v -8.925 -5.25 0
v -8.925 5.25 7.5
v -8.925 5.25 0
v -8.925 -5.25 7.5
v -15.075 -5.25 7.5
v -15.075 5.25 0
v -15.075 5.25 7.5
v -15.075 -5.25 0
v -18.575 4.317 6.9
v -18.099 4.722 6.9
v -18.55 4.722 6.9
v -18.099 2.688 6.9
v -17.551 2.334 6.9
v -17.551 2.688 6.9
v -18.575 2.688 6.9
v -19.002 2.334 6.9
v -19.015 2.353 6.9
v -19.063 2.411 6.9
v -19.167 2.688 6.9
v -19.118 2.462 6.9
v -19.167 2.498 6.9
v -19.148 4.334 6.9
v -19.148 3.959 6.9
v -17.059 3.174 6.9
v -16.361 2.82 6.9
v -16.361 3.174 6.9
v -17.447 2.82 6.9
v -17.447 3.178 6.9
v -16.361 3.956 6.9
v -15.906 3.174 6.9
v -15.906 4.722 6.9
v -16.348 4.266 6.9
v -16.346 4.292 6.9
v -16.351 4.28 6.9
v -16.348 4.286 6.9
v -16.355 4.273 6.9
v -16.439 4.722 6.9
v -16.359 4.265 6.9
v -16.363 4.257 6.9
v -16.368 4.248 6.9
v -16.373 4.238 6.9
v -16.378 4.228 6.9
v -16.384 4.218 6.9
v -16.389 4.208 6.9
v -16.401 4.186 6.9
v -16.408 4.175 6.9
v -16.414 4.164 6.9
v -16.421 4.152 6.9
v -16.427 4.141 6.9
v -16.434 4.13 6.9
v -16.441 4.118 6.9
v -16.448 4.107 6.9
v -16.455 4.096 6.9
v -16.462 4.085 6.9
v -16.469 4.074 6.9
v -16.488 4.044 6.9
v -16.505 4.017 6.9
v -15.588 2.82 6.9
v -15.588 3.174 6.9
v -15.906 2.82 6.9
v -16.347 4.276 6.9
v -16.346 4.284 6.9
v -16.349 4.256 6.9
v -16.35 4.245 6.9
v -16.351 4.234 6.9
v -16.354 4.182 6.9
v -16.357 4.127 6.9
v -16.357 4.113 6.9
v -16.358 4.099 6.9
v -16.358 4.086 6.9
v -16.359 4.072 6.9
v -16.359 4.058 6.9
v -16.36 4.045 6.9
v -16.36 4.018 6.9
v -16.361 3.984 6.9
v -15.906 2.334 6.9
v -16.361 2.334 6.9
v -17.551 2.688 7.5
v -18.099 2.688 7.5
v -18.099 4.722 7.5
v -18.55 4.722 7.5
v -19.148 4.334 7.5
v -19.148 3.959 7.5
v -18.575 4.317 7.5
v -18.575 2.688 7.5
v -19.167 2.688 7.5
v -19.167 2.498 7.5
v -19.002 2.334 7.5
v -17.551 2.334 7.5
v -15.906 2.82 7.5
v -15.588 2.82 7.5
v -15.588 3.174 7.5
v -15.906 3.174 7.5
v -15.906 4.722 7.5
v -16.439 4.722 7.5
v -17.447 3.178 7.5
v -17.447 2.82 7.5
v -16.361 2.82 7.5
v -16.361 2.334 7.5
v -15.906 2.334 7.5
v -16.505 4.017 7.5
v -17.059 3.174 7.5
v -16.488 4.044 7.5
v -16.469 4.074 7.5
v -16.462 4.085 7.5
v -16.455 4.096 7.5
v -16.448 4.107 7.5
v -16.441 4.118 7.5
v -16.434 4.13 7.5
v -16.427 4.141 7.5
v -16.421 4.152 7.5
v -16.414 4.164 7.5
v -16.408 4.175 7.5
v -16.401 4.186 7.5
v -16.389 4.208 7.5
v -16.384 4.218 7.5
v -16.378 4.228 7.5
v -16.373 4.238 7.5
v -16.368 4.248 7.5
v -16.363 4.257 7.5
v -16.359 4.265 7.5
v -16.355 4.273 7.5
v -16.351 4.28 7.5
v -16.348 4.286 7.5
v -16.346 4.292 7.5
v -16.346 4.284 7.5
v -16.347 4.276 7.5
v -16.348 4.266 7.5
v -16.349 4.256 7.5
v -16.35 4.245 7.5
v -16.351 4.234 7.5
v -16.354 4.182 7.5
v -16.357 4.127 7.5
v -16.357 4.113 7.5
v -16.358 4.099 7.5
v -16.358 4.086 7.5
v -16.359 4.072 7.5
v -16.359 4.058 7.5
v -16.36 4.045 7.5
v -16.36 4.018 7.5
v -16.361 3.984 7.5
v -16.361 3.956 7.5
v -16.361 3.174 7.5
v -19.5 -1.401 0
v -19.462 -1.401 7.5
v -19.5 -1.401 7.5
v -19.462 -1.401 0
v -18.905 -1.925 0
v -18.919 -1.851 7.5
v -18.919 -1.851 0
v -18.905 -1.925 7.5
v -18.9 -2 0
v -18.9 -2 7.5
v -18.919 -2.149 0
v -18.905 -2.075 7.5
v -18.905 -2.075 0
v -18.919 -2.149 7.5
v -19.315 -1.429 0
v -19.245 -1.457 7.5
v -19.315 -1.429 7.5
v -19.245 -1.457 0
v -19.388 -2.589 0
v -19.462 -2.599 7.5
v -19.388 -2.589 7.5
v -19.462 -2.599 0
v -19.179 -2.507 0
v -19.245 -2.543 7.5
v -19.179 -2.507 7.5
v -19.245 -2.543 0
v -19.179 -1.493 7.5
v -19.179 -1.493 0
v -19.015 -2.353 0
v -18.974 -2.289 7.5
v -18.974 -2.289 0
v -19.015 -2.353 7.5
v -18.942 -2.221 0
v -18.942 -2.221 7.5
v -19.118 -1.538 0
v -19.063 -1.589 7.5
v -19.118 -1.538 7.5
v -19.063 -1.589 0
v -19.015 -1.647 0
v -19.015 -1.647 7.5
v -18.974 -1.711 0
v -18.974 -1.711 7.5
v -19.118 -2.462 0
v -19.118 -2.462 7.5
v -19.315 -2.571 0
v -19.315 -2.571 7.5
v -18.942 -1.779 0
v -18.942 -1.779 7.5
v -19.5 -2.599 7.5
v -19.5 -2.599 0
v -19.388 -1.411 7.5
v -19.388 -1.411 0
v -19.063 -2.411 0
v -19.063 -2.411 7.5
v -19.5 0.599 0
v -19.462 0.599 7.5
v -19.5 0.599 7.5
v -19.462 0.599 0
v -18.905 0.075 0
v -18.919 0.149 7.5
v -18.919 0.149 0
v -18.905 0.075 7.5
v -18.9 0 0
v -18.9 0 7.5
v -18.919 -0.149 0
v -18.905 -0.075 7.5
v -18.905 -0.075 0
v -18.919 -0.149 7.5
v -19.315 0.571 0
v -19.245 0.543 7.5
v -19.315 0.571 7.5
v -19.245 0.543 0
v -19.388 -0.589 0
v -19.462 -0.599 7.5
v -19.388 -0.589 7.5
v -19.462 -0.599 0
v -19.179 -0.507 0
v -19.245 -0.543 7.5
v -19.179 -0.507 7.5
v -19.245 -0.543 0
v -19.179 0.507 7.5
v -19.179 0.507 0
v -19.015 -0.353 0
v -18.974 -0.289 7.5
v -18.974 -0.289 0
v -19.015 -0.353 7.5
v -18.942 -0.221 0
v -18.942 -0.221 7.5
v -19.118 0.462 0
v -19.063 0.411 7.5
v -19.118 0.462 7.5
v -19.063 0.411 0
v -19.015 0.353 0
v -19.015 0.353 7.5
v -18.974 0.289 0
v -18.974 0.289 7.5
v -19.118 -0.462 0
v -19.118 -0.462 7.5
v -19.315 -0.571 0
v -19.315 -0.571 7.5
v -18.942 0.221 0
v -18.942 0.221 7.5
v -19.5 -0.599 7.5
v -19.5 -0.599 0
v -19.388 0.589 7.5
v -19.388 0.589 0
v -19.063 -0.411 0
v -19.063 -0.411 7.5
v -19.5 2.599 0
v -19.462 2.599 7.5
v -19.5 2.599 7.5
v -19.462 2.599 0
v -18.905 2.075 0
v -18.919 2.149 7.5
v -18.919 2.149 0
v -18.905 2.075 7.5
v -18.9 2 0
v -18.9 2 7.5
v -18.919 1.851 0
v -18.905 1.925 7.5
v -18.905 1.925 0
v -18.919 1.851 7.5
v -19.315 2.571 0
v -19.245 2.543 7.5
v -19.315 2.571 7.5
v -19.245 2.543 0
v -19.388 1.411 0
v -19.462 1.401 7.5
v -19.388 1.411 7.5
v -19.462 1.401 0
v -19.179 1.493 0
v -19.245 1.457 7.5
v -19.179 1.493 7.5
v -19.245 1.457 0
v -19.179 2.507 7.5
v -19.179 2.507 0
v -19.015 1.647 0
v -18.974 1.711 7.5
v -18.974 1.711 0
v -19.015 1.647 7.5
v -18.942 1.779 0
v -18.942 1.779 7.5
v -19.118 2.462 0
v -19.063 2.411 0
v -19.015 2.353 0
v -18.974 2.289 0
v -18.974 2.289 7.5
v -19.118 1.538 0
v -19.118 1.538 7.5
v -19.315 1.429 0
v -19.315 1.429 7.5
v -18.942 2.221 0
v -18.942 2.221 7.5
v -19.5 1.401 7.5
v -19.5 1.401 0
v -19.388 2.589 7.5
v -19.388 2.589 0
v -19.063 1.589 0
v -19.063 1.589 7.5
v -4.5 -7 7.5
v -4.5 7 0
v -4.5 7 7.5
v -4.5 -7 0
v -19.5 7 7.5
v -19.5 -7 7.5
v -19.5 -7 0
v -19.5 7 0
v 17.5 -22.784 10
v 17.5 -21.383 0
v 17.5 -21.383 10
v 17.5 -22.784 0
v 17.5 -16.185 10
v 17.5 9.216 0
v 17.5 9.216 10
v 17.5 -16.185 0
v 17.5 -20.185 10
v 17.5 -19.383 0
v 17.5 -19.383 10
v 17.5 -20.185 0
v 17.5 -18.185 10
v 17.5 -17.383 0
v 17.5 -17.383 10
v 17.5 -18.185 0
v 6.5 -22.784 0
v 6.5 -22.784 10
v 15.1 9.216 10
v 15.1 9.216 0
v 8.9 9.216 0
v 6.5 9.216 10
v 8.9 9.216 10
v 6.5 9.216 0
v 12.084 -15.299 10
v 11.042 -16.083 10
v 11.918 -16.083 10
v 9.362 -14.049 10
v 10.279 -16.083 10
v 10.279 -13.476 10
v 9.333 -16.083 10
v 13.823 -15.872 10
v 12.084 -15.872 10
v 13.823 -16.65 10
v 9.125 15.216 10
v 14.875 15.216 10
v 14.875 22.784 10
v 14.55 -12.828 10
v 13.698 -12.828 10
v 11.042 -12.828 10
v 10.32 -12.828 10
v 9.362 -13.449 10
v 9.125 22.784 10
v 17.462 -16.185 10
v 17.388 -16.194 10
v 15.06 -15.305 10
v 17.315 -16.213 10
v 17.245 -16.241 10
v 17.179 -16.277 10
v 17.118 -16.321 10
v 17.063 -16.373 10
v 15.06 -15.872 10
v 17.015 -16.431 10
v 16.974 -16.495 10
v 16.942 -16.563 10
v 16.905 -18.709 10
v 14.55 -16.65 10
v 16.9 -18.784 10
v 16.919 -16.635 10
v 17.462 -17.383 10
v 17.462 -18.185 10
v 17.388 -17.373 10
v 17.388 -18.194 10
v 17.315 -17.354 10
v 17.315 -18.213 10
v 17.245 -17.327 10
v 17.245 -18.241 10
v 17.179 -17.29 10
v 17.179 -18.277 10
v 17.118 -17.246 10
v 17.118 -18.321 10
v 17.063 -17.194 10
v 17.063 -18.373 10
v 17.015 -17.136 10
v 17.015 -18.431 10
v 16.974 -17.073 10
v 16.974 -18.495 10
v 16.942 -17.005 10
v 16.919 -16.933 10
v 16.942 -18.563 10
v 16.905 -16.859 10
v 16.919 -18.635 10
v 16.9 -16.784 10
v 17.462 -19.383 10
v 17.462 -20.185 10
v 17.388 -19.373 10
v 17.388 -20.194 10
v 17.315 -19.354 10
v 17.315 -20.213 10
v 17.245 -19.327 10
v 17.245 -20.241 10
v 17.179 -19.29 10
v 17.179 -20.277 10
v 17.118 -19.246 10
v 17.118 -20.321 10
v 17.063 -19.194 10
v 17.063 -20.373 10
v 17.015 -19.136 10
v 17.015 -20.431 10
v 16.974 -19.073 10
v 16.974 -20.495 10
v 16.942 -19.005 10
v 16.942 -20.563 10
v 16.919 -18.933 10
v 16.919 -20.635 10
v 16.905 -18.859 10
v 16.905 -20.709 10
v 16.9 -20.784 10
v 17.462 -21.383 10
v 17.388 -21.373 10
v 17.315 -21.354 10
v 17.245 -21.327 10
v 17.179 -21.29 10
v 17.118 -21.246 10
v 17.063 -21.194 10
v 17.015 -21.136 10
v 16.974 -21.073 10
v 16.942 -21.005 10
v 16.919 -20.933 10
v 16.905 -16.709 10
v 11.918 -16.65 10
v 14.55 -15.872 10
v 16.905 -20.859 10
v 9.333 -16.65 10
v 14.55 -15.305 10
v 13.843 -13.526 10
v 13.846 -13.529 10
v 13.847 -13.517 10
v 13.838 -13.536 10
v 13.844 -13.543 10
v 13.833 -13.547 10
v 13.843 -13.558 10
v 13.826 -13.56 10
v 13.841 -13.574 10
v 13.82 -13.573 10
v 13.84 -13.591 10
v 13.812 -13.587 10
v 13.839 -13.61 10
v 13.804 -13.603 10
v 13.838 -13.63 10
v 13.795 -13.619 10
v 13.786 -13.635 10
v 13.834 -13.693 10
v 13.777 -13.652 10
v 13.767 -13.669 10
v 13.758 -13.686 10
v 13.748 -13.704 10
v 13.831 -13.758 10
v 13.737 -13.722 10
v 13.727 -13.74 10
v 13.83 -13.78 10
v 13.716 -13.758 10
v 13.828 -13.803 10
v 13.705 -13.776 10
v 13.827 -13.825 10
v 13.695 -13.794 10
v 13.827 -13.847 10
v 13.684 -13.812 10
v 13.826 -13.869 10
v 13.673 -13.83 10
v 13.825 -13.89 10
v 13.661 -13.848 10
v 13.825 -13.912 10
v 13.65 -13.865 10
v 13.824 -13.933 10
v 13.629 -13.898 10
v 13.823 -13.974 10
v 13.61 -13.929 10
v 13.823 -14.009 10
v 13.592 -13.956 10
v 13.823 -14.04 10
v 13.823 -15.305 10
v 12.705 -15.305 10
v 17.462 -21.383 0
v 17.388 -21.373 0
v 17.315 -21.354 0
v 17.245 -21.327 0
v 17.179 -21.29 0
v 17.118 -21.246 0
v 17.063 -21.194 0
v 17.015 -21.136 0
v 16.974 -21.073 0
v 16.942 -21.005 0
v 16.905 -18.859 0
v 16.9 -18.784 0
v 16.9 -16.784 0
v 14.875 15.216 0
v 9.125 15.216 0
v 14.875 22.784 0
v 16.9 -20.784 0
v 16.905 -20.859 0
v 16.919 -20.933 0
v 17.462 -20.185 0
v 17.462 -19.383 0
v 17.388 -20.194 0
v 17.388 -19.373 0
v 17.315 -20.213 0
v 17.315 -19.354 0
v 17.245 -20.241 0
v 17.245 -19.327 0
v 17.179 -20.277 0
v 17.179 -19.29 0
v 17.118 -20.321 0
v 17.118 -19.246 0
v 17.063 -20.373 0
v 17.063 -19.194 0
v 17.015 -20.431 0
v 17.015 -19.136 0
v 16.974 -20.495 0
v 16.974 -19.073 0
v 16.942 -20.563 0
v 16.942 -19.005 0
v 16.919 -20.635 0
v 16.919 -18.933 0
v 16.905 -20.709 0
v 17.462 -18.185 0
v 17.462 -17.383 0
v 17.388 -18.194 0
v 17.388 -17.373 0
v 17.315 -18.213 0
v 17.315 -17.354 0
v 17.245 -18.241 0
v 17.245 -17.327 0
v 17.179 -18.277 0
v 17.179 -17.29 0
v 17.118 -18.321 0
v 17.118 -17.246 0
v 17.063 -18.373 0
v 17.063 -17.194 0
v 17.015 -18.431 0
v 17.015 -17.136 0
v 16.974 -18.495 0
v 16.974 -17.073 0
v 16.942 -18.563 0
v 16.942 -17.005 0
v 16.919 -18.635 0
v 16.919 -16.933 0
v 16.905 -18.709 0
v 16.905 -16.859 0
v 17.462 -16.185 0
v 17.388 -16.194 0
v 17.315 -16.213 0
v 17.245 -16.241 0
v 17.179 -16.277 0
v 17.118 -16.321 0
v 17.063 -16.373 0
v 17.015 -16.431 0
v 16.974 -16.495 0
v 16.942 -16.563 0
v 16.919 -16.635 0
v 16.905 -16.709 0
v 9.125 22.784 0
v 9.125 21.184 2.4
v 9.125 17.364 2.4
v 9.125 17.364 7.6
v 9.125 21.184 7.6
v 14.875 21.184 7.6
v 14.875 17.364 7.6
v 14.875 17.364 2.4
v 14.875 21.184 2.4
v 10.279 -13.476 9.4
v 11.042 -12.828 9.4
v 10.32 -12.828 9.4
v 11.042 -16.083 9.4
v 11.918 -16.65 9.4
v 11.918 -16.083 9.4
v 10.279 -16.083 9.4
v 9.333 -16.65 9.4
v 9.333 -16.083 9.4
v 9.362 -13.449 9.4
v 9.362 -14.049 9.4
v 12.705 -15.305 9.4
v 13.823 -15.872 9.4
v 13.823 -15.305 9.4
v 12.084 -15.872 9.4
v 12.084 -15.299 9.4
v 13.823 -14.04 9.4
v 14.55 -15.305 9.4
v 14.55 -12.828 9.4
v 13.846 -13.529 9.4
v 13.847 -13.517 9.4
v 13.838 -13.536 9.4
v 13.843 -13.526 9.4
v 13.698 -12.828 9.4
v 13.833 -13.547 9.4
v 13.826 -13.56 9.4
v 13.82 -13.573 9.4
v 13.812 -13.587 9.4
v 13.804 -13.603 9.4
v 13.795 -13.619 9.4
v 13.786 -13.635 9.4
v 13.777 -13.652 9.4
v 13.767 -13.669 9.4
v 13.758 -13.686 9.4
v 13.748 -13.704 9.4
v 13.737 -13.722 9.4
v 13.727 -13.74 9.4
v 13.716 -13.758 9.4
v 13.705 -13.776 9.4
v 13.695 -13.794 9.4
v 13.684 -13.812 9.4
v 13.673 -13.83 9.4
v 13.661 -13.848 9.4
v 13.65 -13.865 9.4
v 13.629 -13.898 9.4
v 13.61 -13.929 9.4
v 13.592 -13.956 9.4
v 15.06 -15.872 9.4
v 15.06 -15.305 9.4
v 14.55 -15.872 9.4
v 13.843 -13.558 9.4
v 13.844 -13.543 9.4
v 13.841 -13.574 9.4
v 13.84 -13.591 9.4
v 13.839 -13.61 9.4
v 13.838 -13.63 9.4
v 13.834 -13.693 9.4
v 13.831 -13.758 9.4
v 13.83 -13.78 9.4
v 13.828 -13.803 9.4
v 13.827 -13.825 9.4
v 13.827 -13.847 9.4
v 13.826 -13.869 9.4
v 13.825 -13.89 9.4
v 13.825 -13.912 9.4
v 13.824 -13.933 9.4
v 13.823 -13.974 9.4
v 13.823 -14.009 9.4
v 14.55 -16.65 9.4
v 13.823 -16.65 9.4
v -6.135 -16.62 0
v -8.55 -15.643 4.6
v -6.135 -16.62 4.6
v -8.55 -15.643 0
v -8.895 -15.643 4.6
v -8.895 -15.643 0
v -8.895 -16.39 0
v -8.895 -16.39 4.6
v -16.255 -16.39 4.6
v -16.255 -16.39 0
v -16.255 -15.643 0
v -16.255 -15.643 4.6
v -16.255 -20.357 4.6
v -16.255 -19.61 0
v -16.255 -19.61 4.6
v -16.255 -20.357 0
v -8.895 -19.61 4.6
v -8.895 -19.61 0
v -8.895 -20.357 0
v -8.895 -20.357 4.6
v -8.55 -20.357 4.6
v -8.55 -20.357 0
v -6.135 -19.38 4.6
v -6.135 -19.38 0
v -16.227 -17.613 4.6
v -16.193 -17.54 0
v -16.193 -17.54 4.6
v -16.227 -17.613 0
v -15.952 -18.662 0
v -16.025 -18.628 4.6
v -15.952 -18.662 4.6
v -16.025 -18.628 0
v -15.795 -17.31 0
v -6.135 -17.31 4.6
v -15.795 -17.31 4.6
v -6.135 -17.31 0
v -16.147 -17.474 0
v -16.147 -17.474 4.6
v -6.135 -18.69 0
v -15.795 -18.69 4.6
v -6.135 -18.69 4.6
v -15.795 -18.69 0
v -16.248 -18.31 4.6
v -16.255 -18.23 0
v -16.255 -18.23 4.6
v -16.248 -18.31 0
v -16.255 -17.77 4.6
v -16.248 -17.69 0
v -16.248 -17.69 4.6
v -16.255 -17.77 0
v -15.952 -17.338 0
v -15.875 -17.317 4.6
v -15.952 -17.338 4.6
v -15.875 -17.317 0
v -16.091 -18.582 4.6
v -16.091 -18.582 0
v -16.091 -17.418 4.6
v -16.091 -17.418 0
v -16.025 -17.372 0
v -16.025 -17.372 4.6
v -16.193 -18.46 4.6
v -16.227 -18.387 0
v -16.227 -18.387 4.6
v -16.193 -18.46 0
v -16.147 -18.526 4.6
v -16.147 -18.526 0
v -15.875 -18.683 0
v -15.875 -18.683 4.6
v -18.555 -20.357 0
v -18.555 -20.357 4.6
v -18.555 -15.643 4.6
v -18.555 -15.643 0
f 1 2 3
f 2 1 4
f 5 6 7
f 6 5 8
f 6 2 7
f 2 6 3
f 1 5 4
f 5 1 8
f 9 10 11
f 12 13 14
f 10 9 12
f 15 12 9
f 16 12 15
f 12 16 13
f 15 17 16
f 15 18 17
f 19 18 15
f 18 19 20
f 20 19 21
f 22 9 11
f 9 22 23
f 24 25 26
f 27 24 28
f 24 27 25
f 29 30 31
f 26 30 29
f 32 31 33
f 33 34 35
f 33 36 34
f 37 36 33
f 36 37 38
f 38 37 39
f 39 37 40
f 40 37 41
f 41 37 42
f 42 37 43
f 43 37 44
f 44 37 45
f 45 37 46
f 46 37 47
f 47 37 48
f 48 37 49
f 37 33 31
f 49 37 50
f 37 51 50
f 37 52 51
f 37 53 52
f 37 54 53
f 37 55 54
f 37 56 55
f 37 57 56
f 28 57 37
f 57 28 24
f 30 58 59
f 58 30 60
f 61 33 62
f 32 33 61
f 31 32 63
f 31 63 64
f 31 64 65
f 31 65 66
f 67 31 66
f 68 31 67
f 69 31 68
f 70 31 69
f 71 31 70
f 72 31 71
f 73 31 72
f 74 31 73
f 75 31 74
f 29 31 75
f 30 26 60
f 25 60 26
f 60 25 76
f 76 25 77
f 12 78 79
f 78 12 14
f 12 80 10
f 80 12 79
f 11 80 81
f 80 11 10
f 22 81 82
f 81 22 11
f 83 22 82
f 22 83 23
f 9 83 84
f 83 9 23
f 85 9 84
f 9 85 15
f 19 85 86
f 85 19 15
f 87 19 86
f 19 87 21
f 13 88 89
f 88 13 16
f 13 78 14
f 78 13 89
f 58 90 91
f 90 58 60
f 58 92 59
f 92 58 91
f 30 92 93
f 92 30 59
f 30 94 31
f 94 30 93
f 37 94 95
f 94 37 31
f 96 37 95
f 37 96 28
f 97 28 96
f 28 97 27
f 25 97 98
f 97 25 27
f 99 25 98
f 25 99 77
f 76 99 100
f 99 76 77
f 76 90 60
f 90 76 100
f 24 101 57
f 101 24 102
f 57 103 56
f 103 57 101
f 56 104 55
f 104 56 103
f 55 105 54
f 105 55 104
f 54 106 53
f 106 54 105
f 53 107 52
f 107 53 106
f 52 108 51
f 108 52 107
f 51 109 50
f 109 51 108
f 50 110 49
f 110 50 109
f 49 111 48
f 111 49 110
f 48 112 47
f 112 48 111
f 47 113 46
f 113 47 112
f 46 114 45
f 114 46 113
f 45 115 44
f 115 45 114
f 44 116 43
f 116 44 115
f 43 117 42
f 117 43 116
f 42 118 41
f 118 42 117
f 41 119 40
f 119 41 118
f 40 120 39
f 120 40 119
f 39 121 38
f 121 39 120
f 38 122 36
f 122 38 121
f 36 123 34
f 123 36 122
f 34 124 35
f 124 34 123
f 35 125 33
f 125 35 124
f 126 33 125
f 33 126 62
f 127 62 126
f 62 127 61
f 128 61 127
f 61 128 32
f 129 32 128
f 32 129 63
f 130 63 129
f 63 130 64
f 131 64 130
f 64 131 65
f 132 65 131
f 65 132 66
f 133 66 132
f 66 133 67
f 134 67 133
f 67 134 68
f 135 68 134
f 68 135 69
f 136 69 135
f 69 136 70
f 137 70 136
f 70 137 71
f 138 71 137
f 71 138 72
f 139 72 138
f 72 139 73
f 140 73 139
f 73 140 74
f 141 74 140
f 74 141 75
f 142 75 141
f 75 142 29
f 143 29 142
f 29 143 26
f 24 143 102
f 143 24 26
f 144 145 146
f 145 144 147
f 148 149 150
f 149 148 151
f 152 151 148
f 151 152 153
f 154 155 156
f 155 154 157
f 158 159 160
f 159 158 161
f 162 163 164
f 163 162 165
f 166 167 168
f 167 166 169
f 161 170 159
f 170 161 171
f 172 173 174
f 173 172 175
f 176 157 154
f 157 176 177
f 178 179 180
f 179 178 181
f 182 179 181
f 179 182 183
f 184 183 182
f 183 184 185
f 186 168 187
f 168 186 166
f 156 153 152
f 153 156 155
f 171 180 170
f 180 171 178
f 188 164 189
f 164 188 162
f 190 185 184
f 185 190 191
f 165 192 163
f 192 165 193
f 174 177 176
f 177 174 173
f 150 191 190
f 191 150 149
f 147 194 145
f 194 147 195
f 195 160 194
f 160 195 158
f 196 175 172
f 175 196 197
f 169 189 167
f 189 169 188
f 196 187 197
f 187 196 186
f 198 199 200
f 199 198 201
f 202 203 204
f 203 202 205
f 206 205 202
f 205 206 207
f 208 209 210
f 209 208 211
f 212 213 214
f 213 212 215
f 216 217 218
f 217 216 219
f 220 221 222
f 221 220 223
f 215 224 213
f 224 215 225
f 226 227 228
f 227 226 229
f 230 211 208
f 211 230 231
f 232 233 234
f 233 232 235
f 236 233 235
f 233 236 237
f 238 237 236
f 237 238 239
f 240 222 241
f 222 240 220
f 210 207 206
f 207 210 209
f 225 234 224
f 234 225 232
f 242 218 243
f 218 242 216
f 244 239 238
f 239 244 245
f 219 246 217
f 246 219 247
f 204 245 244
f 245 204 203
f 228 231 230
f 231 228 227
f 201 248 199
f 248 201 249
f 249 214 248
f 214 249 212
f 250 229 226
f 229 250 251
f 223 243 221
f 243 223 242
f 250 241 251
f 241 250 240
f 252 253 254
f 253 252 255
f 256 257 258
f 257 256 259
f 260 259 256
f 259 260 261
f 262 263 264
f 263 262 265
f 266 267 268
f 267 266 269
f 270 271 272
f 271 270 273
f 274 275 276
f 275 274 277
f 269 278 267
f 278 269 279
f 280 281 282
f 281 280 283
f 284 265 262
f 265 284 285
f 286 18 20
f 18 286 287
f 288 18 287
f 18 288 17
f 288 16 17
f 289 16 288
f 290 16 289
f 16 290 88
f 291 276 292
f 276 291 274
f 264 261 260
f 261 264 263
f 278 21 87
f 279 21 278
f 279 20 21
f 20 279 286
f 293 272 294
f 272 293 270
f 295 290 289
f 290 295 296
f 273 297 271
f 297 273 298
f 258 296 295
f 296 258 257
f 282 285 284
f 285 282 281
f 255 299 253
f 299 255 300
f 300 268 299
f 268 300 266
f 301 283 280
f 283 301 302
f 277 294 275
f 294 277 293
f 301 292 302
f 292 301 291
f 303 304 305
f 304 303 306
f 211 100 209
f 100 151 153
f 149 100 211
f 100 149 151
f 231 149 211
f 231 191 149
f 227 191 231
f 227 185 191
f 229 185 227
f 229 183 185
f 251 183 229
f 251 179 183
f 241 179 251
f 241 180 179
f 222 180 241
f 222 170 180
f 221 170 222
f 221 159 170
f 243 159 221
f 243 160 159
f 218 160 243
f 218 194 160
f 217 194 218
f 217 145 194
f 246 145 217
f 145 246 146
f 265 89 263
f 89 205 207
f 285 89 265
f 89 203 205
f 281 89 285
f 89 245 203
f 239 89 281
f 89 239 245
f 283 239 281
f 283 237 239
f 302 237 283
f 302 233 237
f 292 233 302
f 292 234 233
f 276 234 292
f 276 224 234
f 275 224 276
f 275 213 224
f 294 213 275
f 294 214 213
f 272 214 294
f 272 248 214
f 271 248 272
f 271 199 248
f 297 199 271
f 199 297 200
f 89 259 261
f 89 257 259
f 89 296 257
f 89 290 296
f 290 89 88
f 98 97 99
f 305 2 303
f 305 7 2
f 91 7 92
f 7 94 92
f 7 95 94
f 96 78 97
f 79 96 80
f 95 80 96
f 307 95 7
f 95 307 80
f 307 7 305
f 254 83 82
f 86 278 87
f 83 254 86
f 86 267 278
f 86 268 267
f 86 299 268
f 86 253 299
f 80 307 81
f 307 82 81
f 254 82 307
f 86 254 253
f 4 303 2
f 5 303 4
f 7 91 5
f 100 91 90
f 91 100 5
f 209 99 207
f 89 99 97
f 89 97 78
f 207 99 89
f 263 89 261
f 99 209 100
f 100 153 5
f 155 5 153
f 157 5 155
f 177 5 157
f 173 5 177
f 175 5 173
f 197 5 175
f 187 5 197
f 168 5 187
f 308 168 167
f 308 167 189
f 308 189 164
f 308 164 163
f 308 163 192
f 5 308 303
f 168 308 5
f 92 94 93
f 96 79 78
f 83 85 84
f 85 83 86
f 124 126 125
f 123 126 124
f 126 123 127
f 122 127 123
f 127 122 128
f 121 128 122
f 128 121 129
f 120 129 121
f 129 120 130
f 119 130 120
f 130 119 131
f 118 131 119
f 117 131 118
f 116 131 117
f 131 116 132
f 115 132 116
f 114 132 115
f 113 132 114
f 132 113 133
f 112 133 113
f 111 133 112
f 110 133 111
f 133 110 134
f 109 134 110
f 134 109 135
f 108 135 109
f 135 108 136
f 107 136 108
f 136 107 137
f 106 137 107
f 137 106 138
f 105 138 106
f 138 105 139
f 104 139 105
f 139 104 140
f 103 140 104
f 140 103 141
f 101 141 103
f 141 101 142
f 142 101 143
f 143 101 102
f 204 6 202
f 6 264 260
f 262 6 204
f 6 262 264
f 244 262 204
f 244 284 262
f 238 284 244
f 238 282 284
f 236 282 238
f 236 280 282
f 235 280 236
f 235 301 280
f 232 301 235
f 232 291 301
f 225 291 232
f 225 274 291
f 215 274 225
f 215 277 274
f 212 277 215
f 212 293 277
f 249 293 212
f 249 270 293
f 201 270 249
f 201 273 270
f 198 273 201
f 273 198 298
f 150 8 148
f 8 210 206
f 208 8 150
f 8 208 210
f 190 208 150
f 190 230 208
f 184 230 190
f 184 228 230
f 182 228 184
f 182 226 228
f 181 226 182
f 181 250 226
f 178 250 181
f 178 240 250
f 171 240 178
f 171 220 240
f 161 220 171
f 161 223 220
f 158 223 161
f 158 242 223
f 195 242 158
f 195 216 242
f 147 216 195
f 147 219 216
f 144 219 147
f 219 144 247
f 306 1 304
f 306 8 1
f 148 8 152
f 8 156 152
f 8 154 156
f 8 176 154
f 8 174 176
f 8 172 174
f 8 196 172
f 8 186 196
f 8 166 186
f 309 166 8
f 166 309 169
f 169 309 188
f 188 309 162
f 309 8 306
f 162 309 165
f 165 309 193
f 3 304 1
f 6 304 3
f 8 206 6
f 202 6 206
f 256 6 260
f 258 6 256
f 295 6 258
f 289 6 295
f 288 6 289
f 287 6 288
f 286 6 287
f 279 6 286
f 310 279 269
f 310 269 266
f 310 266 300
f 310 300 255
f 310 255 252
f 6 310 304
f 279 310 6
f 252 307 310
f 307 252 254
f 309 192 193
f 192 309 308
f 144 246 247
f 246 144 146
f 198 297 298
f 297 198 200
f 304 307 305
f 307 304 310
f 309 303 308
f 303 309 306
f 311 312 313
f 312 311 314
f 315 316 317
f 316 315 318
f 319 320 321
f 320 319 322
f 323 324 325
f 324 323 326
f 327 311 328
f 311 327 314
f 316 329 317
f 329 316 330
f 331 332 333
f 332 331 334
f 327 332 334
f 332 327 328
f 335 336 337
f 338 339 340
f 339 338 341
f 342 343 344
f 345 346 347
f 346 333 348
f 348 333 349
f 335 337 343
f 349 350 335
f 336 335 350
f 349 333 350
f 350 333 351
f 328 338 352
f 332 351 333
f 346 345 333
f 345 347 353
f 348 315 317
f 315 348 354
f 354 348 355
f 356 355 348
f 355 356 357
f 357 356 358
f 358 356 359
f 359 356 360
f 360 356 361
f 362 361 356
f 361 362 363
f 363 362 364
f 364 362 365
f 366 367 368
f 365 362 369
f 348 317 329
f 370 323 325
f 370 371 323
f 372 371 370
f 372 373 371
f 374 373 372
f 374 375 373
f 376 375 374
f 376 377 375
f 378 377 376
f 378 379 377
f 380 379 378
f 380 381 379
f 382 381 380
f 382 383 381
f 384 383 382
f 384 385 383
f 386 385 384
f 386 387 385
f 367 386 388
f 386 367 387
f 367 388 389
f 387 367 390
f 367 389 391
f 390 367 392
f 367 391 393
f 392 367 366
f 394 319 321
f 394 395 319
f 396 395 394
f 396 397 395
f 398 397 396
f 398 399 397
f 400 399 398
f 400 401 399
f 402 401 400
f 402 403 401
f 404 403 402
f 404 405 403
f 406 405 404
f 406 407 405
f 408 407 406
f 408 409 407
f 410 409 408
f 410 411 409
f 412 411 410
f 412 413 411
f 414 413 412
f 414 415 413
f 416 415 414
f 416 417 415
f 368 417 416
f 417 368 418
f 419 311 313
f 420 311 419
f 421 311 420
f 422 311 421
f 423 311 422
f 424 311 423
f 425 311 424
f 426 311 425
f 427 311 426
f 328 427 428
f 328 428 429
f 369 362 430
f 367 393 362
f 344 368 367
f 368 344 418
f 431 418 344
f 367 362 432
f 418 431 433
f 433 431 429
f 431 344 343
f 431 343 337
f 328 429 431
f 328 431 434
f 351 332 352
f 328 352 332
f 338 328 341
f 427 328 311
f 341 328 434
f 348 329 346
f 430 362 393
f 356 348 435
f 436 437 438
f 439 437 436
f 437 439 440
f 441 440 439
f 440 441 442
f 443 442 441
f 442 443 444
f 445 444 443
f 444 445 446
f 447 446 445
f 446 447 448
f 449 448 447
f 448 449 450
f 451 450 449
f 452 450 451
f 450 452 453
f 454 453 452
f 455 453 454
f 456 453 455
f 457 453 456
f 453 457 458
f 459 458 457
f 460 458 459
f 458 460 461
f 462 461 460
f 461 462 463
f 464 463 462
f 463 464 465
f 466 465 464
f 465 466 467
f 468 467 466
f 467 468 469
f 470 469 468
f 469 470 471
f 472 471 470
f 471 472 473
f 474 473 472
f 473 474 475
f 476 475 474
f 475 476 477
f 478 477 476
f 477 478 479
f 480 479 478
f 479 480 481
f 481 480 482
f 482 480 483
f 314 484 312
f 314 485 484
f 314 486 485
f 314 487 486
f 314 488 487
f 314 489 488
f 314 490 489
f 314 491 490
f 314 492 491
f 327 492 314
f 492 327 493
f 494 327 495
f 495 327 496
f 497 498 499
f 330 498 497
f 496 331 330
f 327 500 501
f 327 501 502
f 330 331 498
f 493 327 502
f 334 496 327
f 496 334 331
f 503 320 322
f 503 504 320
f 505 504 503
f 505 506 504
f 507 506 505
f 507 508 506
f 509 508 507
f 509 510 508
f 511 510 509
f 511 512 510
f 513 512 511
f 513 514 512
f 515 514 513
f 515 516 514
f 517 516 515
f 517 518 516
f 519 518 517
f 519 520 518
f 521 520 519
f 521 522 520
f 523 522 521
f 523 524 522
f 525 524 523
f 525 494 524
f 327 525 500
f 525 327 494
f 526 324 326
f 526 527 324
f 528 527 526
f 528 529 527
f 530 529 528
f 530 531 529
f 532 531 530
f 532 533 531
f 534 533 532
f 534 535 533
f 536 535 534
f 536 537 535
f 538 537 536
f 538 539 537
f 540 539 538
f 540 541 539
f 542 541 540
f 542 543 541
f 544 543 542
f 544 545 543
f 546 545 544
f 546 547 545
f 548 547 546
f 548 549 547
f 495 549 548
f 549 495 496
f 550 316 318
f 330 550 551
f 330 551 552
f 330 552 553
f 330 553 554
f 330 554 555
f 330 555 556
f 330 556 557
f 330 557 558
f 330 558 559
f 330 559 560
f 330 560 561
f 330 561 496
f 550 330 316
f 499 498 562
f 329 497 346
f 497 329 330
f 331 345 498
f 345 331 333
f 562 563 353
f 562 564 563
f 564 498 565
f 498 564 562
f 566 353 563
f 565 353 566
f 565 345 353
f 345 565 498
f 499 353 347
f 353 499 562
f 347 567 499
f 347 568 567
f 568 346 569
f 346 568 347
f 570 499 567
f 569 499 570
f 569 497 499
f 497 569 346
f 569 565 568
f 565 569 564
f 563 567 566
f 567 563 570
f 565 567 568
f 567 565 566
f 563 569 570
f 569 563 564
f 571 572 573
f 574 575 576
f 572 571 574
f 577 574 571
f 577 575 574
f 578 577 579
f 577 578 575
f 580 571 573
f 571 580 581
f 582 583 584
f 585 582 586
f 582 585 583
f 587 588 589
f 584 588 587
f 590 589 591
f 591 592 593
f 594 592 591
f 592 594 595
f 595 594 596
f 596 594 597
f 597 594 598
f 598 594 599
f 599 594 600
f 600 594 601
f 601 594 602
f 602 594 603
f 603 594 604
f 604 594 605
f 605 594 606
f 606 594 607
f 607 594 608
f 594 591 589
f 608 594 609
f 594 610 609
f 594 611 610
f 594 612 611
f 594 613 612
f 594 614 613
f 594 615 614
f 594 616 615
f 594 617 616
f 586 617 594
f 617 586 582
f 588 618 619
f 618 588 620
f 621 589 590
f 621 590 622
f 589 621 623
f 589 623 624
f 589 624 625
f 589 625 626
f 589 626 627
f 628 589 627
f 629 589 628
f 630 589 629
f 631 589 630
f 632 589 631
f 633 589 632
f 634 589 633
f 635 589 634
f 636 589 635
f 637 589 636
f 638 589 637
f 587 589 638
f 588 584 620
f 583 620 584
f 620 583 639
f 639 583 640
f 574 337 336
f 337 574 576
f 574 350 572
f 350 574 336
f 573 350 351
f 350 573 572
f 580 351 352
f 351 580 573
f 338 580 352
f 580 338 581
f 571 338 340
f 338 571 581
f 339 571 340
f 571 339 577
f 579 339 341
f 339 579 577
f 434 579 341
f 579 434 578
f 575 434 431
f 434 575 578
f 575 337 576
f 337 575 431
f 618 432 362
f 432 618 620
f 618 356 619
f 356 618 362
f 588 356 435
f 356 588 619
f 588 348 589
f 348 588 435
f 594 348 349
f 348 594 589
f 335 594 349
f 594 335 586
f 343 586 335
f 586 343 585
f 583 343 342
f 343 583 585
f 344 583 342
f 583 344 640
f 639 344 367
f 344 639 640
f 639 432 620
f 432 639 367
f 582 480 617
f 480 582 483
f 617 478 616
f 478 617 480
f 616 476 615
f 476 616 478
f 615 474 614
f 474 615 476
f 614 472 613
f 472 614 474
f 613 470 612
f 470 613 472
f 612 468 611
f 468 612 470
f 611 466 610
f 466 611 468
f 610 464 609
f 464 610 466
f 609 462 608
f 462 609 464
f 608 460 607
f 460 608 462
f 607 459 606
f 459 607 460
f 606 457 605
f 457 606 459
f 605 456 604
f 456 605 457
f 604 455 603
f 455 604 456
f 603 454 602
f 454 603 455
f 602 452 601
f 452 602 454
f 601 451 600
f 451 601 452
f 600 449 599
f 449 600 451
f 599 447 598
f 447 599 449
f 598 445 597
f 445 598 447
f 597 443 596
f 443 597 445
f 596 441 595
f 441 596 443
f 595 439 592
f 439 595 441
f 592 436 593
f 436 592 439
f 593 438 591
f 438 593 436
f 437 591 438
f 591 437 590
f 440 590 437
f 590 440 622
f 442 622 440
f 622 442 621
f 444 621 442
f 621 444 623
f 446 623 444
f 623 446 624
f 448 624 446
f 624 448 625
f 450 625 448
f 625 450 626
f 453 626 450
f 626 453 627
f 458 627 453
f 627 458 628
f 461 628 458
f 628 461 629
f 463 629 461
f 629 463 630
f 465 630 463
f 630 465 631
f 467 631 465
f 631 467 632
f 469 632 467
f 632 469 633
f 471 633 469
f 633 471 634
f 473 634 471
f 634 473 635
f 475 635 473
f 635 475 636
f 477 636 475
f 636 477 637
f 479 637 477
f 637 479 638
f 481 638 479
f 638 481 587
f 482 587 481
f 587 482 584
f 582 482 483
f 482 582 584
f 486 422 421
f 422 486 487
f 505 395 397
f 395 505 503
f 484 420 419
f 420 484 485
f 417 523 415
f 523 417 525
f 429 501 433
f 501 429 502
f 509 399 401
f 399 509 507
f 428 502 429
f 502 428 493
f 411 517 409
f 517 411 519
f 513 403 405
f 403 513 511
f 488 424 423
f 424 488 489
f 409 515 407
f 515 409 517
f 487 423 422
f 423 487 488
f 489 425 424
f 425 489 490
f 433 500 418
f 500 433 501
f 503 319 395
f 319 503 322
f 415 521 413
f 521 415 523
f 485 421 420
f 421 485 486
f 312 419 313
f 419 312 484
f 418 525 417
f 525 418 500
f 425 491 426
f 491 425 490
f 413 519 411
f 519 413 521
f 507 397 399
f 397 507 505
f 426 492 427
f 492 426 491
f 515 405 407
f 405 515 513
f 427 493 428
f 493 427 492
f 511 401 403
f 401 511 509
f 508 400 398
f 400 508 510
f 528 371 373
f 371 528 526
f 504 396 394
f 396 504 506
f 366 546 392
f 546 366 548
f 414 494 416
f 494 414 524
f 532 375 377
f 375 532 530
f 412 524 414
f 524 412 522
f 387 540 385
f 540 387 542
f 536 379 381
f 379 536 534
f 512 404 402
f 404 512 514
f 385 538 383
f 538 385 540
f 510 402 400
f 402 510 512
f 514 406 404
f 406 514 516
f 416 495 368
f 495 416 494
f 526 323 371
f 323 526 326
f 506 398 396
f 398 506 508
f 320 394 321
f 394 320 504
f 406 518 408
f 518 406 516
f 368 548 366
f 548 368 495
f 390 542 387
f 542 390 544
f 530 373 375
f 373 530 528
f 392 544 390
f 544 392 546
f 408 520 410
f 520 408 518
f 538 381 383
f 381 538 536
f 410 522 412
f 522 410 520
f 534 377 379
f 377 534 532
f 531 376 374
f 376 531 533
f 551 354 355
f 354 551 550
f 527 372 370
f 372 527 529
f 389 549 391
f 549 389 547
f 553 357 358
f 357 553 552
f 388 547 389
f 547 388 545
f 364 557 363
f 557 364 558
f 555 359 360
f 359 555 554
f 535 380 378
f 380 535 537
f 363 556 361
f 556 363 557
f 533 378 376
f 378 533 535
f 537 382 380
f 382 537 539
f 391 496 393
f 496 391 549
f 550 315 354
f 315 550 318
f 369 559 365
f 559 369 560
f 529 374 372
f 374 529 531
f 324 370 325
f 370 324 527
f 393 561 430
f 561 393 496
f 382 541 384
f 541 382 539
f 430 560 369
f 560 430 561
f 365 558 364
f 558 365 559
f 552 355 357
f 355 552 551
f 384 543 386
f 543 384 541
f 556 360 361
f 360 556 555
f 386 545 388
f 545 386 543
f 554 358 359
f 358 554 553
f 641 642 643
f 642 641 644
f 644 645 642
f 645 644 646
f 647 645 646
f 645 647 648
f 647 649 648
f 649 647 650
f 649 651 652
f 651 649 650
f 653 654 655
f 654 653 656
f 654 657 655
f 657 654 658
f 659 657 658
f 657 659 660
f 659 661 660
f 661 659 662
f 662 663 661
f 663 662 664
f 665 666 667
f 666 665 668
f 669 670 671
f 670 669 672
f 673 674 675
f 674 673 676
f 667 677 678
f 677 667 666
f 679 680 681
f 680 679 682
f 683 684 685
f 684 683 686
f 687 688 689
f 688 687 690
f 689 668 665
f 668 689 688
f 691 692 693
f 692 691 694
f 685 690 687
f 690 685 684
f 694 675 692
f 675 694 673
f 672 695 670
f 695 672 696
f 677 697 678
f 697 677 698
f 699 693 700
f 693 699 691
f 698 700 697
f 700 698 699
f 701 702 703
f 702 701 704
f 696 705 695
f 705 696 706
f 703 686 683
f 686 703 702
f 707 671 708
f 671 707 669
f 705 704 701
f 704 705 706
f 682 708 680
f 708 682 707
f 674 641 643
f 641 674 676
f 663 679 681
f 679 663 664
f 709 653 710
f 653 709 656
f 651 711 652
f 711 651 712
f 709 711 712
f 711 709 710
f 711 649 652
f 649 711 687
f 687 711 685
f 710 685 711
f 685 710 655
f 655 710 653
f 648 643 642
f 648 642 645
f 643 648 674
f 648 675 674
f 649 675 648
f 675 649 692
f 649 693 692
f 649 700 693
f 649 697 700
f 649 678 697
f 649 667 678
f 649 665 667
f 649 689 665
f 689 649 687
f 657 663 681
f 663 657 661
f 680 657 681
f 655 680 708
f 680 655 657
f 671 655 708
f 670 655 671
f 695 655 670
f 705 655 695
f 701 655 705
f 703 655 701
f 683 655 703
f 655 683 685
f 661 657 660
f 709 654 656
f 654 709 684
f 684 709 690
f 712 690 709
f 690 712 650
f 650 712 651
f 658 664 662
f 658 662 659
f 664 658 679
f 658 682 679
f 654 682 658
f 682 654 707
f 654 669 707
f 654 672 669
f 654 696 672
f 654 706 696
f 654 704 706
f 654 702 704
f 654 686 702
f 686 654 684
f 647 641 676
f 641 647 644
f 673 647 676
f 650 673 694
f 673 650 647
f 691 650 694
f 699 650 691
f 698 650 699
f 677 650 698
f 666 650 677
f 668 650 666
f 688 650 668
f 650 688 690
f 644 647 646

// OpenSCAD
$fn = 50;

difference() {
	union() {
		translate(v = [-12, -5, 0]) {
			rotate(a = [0, 0, 0]) {
				difference() {
					union() {
						translate(v = [-7.5, -2.0, 0]) {
							cube(size = [15.0, 14.0, 7.5]);
						}
					}
					union() {
						translate(v = [-3.075, -0.25, -0.1]) {
							cube(size = [6.15, 10.5, 7.7]);
						}
						translate(v = [-5.5, 8.5, 6.9]) {
							linear_extrude(height = 0.7) {
								text(font = "Arial:style=Bold", halign = "center", size = 2.5, text = "14", valign = "center");
							}
						}
						translate(v = [-7.5, 3, -0.1]) {
							cylinder(h = 7.7, r = 0.6);
						}
						translate(v = [-7.5, 5, -0.1]) {
							cylinder(h = 7.7, r = 0.6);
						}
						translate(v = [-7.5, 7, -0.1]) {
							cylinder(h = 7.7, r = 0.6);
						}
					}
				}
			}
		}
		translate(v = [12, 9.21625, 0]) {
			rotate(a = [90, 0, 0]) {
				difference() {
					union() {
						translate(v = [-5.5, 0, 0]) {
							cube(size = [11.0, 10.0, 32.0]);
						}
						translate(v = [0, 10.0, 0]) {
							rotate(a = [90, 0, 0]) {
								linear_extrude(height = 10.0) {
									polygon(points = [[-2.875, -13.5675], [2.875, -13.5675], [2.875, -6.0], [3.1, 0], [3.1, 0.1], [-3.1, 0.1], [-3.1, 0], [-2.875, -6.0]]);
								}
							}
						}
					}
					union() {
						translate(v = [-2.975, 2.4000000000000004, -11.9675]) {
							cube(size = [5.95, 5.199999999999999, 3.8200000000000003]);
						}
						translate(v = [0, 9.4, 24.0]) {
							rotate(a = [-90, 0, 0]) {
								linear_extrude(height = 0.7) {
									text(font = "Arial:style=Bold", halign = "center", size = 4.0, text = "14", valign = "center");
								}
							}
						}
						translate(v = [5.5, 10.1, 30.0]) {
							rotate(a = [90, 0, 0]) {
								cylinder(h = 10.2, r = 0.6);
							}
						}
						translate(v = [5.5, 10.1, 28.0]) {
							rotate(a = [90, 0, 0]) {
								cylinder(h = 10.2, r = 0.6);
							}
						}
						translate(v = [5.5, 10.1, 26.0]) {
							rotate(a = [90, 0, 0]) {
								cylinder(h = 10.2, r = 0.6);
							}
						}
					}
				}
			}
		}
		translate(v = [-12, -18, 0]) {
			rotate(a = [90, 0, 0]) {
				difference() {
					union() {
						translate(v = [-6.555, 0, -2.3575]) {
							cube(size = [12.42, 4.6, 4.715]);
						}
					}
					union() {
						translate(v = [0, 4.699999999999999, 0]) {
							rotate(a = [90, 0, 0]) {
								linear_extrude(height = 4.8) {
									polygon(points = [[-4.255, -1.61], [3.105, -1.61], [3.105, -2.3575], [3.45, -2.3575], [5.865, -1.38], [5.965, -1.38], [5.965, -2.4575], [-4.255, -2.4575]]);
								}
							}
						}
						translate(v = [0, 4.699999999999999, 0]) {
							rotate(a = [90, 0, 0]) {
								linear_extrude(height = 4.8) {
									polygon(points = [[-4.255, 1.61], [3.105, 1.61], [3.105, 2.3575], [3.45, 2.3575], [5.865, 1.38], [5.965, 1.38], [5.965, 2.4575], [-4.255, 2.4575]]);
								}
							}
						}
						translate(v = [0, 4.699999999999999, 0]) {
							rotate(a = [90, 0, 0]) {
								linear_extrude(height = 4.8) {
									polygon(points = [[-4.255, 0.23], [-4.248012, 0.309878], [-4.227259, 0.387329], [-4.193372, 0.46], [-4.14738, 0.525682], [-4.090682, 0.58238], [-4.025, 0.628372], [-3.952329, 0.662259], [-3.874878, 0.683012], [-3.795, 0.69], [5.965, 0.69], [5.965, -0.69], [-3.795, -0.69], [-3.874878, -0.683012], [-3.952329, -0.662259], [-4.025, -0.628372], [-4.090682, -0.58238], [-4.14738, -0.525682], [-4.193372, -0.46], [-4.227259, -0.387329], [-4.248012, -0.309878], [-4.255, -0.23]]);
								}
							}
						}
					}
				}
			}
		}
	}
	union();
}
